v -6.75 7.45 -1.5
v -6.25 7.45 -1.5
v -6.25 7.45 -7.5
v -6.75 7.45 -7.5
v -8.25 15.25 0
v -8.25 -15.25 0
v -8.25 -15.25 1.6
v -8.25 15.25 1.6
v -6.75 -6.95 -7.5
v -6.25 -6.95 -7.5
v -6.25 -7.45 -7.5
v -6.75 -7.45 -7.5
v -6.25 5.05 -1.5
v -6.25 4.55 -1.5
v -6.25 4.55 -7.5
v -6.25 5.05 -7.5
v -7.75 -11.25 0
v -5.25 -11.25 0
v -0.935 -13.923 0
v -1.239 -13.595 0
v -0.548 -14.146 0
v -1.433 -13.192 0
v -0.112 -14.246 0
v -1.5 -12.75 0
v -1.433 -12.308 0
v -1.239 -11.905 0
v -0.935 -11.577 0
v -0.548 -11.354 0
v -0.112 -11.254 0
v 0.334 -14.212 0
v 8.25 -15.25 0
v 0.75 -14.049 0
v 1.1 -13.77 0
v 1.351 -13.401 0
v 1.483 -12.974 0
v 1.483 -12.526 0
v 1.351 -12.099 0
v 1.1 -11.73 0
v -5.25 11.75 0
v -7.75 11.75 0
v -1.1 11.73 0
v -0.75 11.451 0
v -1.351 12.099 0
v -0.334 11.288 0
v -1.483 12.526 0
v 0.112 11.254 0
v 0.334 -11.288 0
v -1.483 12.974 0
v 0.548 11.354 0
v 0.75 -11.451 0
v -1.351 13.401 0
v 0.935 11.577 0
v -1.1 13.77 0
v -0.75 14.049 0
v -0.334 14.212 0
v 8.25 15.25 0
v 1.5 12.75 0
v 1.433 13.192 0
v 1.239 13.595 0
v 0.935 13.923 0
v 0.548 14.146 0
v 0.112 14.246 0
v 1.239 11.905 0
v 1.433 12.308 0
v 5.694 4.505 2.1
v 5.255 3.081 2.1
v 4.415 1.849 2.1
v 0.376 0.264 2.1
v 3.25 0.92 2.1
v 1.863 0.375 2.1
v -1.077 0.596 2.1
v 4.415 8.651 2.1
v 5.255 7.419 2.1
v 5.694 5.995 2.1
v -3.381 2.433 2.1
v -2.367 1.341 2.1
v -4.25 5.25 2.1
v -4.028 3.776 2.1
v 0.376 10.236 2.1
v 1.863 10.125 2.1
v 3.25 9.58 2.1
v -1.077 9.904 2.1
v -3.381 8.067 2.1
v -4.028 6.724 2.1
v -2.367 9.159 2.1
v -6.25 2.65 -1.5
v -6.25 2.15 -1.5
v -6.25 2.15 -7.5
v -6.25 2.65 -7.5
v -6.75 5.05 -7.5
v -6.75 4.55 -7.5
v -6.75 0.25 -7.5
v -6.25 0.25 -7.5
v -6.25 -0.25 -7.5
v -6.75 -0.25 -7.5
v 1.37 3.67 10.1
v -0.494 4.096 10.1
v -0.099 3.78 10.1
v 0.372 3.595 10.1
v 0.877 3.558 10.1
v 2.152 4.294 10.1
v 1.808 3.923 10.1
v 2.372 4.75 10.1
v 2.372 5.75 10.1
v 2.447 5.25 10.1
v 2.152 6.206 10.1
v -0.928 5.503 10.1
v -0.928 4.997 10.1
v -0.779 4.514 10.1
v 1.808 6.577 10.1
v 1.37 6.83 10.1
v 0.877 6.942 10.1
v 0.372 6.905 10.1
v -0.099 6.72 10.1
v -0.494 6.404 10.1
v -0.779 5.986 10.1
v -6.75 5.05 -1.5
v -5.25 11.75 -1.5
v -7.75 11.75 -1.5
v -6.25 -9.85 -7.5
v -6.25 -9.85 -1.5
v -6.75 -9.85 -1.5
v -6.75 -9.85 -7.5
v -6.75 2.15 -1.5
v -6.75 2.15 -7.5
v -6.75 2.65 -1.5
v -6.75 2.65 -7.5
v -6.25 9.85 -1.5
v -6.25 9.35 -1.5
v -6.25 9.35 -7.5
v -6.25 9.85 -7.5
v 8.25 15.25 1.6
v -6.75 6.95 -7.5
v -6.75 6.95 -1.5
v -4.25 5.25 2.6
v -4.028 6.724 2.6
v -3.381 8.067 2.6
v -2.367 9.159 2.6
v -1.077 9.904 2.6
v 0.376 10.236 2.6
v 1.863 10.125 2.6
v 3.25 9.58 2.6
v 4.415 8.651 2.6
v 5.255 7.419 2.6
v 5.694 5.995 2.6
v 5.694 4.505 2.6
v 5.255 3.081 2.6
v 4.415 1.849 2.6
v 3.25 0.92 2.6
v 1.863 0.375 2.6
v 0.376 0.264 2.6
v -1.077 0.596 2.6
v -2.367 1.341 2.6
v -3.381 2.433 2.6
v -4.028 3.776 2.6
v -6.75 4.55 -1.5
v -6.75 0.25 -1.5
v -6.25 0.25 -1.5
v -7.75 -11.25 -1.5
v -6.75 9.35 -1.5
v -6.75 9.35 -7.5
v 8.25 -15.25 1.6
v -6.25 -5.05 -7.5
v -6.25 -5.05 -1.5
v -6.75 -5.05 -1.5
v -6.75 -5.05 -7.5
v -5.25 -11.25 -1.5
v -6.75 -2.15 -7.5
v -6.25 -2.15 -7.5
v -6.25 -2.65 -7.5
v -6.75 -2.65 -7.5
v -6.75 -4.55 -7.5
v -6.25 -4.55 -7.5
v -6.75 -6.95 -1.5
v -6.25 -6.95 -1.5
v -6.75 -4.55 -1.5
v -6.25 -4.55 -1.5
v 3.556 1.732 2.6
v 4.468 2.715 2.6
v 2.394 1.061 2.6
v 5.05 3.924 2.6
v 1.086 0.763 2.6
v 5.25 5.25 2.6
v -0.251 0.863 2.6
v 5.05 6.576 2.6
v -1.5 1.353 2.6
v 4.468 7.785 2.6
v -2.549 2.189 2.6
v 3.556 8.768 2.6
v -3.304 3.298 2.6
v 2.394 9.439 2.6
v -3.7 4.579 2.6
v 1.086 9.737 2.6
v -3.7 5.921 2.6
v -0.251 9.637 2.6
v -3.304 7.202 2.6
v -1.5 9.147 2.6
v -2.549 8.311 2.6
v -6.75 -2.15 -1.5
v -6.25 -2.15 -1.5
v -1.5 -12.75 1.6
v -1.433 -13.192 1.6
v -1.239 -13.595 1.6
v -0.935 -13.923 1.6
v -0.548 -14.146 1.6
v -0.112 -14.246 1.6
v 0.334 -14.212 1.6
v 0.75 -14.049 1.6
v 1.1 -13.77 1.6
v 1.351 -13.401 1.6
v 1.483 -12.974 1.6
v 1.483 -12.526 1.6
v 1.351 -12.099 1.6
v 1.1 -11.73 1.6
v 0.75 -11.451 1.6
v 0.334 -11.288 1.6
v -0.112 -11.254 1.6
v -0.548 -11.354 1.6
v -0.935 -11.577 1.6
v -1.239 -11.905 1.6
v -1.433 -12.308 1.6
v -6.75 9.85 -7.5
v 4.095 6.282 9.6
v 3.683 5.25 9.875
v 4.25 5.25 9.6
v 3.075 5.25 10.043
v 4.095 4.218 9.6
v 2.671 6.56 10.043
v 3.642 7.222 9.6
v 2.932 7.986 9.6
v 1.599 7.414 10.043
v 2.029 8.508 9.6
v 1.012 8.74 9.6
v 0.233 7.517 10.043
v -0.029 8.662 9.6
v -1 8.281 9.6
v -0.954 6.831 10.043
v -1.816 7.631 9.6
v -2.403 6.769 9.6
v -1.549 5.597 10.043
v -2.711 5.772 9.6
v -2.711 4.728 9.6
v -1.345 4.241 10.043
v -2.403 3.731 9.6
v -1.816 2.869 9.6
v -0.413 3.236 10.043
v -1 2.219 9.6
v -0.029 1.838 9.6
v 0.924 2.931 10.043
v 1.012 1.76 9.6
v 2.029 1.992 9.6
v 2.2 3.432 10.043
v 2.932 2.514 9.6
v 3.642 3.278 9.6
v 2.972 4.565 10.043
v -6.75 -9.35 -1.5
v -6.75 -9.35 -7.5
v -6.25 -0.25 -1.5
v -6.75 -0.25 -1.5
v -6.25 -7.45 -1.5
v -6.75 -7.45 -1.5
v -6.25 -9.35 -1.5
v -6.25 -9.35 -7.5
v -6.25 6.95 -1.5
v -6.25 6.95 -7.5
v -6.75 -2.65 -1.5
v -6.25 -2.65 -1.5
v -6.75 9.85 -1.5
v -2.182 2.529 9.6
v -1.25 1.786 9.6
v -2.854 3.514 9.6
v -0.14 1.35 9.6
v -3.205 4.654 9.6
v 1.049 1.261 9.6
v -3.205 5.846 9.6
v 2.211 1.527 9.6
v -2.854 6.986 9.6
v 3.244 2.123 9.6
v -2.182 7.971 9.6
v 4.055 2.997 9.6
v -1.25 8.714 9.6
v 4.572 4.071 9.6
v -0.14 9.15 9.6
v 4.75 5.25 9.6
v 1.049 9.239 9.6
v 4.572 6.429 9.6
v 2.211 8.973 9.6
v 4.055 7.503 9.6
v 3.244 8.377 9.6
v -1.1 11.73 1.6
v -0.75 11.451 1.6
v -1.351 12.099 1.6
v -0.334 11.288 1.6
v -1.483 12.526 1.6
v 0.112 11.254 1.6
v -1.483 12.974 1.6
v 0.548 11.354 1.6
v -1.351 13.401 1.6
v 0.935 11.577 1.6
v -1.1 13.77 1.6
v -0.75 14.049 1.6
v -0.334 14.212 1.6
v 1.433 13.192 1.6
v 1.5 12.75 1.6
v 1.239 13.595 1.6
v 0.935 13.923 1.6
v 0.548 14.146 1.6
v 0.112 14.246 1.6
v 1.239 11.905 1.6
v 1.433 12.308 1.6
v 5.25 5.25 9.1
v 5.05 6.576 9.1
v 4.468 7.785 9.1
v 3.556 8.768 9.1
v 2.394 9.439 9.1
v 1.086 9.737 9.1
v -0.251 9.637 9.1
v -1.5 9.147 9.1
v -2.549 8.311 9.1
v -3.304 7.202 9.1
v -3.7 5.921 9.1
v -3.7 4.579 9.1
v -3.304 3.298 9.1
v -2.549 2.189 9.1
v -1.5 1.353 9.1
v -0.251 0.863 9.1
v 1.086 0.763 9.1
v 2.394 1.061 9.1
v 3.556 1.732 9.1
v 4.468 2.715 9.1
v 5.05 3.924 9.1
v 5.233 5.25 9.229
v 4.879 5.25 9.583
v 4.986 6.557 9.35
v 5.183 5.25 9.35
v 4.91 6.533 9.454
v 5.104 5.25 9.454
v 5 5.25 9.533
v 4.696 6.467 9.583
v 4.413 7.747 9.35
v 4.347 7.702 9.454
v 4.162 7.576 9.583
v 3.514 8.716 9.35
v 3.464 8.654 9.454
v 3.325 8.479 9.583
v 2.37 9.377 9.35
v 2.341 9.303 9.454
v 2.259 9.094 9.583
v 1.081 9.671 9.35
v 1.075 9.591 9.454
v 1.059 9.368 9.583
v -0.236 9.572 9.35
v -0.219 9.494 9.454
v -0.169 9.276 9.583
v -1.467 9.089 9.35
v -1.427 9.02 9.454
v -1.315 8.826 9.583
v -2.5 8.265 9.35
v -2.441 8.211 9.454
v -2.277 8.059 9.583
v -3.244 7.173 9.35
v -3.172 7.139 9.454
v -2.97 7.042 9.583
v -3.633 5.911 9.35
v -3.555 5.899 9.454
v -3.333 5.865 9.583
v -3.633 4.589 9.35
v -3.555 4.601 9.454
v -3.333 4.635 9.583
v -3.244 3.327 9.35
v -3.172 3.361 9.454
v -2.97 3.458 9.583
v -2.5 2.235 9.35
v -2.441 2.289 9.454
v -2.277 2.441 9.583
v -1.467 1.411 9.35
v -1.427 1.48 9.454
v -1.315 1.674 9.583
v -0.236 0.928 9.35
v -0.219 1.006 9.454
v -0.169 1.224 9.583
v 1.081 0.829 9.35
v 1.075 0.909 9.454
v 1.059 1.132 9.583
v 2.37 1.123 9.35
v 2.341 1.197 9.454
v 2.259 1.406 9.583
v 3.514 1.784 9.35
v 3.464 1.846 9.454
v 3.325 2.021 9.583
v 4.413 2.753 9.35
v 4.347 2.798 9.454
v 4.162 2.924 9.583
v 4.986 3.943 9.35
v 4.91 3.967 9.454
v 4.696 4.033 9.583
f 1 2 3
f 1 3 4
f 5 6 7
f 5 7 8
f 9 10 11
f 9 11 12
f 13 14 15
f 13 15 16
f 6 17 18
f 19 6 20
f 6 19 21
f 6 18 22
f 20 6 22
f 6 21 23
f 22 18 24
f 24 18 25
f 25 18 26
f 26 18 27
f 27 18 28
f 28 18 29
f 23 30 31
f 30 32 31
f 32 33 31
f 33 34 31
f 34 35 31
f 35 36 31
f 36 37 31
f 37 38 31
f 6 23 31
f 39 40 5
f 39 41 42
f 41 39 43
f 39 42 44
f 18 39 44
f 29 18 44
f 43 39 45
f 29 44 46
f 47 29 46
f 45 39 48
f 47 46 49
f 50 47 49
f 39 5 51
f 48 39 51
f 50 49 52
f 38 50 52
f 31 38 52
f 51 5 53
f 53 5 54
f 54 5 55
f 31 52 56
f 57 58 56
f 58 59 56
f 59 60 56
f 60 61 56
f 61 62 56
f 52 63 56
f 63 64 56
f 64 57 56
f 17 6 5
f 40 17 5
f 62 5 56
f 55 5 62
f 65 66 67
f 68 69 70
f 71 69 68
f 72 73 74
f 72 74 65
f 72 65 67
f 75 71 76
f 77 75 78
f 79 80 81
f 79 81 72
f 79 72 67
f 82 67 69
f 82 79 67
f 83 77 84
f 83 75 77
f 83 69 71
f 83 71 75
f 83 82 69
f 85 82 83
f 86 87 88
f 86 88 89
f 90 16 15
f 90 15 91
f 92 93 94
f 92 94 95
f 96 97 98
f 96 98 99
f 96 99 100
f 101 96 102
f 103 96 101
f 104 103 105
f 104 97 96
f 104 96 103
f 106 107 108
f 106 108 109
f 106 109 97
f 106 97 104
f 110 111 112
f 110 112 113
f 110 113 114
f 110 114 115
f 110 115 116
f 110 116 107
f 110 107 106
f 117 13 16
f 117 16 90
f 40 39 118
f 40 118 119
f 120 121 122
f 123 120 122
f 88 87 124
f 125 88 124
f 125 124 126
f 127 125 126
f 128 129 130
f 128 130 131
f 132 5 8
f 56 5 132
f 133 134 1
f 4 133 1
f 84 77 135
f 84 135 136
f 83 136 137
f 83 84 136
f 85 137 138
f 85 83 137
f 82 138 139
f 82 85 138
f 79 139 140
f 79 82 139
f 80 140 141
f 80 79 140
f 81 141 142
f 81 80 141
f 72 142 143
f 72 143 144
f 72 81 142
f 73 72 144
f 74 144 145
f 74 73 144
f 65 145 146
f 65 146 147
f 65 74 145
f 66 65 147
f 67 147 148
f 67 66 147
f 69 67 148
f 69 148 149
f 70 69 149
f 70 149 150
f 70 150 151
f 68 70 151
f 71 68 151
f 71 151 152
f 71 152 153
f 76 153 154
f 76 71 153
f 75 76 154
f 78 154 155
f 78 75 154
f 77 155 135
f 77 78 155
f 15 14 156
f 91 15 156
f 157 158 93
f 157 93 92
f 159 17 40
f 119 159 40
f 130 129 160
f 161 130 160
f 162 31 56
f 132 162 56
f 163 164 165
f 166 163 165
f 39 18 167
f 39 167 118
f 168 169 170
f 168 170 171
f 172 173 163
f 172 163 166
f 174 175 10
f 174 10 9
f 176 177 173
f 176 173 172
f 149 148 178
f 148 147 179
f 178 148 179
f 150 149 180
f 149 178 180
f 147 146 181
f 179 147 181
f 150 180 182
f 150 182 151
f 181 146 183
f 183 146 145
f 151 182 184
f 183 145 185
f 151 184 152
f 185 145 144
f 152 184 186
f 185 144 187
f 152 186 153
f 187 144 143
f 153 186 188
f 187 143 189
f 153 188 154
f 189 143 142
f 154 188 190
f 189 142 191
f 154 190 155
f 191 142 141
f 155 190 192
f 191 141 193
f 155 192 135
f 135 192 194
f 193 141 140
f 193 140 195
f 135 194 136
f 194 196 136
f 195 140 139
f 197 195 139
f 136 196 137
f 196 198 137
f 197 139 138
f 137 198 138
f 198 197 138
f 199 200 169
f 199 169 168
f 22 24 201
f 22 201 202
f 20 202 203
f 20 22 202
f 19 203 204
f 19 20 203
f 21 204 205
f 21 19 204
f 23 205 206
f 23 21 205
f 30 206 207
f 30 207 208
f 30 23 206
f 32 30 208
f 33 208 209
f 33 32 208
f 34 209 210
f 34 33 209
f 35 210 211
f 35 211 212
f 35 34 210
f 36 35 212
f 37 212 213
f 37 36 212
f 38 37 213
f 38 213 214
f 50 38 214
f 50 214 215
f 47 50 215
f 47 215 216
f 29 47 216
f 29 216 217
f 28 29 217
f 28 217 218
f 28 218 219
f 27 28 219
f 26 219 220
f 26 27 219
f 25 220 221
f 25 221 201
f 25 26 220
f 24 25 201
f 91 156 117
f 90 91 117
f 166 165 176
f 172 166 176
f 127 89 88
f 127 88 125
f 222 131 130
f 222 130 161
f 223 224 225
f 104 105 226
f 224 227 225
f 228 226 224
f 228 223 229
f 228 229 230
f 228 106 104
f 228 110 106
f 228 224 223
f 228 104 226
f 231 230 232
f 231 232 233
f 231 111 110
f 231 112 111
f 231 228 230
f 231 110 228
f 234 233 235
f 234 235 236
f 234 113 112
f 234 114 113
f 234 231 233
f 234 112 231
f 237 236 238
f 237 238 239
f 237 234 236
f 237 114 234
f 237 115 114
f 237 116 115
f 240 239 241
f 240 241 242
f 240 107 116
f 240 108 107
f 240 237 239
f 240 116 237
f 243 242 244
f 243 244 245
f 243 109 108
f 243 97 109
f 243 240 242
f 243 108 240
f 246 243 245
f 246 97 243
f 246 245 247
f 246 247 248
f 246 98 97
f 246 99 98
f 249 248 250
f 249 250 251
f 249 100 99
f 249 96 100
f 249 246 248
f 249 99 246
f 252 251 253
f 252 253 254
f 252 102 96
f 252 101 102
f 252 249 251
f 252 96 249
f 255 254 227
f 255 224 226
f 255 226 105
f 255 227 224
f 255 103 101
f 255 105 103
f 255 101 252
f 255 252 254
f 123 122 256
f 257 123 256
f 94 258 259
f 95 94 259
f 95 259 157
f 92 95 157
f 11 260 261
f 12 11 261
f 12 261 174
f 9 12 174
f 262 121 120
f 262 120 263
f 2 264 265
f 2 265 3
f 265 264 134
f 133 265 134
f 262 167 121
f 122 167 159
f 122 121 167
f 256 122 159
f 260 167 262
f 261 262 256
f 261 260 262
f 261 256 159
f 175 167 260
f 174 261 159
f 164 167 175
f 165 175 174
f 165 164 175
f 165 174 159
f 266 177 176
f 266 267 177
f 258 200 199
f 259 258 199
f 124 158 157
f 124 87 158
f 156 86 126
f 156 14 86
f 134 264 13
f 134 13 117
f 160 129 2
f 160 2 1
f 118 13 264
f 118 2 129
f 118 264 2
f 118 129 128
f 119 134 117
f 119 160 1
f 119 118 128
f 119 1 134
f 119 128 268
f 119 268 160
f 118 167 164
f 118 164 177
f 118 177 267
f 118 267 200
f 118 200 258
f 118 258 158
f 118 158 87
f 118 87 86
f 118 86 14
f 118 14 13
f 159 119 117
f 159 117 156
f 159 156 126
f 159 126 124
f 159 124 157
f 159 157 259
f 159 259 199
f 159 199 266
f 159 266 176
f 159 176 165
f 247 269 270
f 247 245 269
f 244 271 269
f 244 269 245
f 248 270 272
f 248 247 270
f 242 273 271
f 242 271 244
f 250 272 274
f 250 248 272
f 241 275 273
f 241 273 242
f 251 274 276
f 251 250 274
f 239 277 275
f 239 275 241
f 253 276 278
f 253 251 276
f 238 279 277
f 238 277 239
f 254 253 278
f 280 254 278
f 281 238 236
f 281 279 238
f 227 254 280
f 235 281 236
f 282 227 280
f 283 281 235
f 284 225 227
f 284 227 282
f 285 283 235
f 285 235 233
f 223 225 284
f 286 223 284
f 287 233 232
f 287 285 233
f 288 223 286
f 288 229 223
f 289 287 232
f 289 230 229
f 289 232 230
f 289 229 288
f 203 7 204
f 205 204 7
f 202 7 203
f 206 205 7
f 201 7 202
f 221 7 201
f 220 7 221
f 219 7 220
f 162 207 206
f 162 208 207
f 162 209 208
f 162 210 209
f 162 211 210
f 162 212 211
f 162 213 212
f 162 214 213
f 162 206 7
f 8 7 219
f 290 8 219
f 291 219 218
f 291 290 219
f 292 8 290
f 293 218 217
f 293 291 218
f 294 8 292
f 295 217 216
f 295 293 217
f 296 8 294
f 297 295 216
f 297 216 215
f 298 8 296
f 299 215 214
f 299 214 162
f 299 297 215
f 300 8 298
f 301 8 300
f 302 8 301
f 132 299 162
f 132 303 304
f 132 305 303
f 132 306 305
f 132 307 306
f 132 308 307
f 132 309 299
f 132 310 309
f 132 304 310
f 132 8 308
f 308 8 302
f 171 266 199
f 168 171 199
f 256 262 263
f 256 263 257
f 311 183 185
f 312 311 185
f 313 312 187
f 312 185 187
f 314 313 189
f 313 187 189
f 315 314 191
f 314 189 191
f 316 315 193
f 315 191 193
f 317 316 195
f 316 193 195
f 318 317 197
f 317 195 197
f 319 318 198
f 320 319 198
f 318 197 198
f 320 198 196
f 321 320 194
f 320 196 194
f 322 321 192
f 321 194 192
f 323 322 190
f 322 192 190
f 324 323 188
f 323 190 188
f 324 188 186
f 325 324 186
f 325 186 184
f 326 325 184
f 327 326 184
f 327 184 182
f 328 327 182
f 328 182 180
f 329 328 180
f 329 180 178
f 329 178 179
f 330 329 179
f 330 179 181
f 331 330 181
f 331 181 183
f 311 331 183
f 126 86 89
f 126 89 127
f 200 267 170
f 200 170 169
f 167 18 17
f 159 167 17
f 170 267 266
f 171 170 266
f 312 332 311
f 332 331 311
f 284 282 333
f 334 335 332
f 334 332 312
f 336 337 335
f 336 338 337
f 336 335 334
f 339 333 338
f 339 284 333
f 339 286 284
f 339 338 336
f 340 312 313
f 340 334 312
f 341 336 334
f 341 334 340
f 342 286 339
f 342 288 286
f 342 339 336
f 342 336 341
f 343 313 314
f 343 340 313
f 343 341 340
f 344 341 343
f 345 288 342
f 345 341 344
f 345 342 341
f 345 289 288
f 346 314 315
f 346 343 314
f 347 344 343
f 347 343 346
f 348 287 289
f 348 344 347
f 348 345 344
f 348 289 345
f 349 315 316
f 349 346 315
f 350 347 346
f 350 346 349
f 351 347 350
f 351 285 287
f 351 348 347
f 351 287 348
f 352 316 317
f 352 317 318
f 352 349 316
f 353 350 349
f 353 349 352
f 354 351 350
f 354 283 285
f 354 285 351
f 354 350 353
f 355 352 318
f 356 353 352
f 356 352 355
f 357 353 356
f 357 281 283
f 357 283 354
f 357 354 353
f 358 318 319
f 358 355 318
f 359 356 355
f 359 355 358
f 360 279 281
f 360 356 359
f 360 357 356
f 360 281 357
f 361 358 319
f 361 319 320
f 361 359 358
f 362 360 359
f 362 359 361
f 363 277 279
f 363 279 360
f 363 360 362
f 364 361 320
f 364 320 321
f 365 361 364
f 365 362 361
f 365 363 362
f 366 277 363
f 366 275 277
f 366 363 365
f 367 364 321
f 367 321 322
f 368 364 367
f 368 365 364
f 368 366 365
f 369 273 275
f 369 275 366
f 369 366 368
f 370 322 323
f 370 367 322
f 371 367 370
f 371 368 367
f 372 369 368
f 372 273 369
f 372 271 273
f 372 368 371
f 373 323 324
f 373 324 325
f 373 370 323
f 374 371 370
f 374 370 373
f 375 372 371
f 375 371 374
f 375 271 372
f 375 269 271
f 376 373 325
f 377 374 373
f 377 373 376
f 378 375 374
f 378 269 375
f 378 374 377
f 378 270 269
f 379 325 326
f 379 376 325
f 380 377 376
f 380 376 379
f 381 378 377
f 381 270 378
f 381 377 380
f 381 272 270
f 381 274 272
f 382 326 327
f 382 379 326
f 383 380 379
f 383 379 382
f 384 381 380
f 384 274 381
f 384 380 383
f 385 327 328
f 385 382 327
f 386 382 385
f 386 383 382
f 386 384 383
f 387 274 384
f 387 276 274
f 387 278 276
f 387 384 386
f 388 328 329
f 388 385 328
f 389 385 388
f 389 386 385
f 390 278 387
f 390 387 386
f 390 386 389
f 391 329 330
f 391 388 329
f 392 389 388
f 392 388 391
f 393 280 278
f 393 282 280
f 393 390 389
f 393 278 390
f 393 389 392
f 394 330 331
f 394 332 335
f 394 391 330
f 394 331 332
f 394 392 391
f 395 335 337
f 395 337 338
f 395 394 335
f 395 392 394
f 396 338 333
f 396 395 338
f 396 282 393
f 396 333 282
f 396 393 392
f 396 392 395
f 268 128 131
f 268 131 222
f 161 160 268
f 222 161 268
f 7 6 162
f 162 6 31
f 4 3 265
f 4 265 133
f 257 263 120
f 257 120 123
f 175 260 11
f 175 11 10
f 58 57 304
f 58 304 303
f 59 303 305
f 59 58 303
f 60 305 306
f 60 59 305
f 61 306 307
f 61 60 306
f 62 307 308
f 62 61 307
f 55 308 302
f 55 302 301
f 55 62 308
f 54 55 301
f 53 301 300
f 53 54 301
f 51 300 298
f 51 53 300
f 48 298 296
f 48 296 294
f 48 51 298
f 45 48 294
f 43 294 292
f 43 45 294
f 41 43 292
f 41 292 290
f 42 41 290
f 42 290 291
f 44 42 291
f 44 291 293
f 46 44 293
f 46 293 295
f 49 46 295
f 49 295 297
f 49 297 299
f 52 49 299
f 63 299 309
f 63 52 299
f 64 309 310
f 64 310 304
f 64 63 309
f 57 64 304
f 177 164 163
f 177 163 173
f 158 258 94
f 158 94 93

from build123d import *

# Parameters (mm, degrees)
SKETCH1_W          = 16.5
SKETCH1_H          = 30.5
SKETCH1_R          = 1.5
EXTRUDE1_DEPTH     = 1.6
EXTRUDE2_START     = 0.5
SKETCH2_R          = 4.5
EXTRUDE2_DEPTH     = 8
SKETCH3_R          = 4.5
SKETCH3_R_2        = 3.5
CUT_EXTRUDE1_DEPTH = 0.5
FILLET2_R          = 3.5
FILLET3_R          = 0.5
SKETCH4_R          = 5
EXTRUDE3_DEPTH     = 0.5
SKETCH5_W          = 2.5
SKETCH5_H          = 23
EXTRUDE4_DEPTH     = 1.5
SKETCH6_W          = 0.5
SKETCH6_H          = 0.5
EXTRUDE5_DEPTH     = 6


with BuildPart() as part:
    # Sketch1 → Extrude1 (new body)
    with BuildSketch(Plane.XY):
        Rectangle(SKETCH1_W, SKETCH1_H)
        with Locations((0, 12.75)):
            Circle(SKETCH1_R, mode=Mode.SUBTRACT)
        with Locations(Location((0, -12.75, 0), (0, 0, 180))):
            Circle(SKETCH1_R, mode=Mode.SUBTRACT)
    extrude(amount=EXTRUDE1_DEPTH)

    # Sketch5 → Extrude4 (add)
    with BuildSketch(Plane(origin=(0, 0, 0), x_dir=(-1, 0, 0), z_dir=(0, 0, -1))):
        with Locations((6.5, 0.25)):
            Rectangle(SKETCH5_W, SKETCH5_H)
    extrude(amount=EXTRUDE4_DEPTH)

    # Sketch6 → Extrude5 (add)
    with BuildSketch(Plane(origin=(0, 0, -1.5), x_dir=(-1, 0, 0), z_dir=(0, 0, -1))):
        with Locations((6.5, 9.6)):
            Rectangle(SKETCH6_W, SKETCH6_H)
        with Locations((6.5, 7.2)):
            Rectangle(SKETCH6_W, SKETCH6_H)
        with Locations((6.5, 4.8)):
            Rectangle(SKETCH6_W, SKETCH6_H)
        with Locations((6.5, 2.4)):
            Rectangle(SKETCH6_W, SKETCH6_H)
        with Locations((6.5, 0)):
            Rectangle(SKETCH6_W, SKETCH6_H)
        with Locations((6.5, -2.4)):
            Rectangle(SKETCH6_W, SKETCH6_H)
        with Locations((6.5, -4.8)):
            Rectangle(SKETCH6_W, SKETCH6_H)
        with Locations((6.5, -7.2)):
            Rectangle(SKETCH6_W, SKETCH6_H)
        with Locations((6.5, -9.6)):
            Rectangle(SKETCH6_W, SKETCH6_H)
    extrude(amount=EXTRUDE5_DEPTH)


with BuildPart() as body_2:
    # Sketch2 → Extrude2 (new body)
    with BuildSketch(Plane.XY.offset(1.6).offset(EXTRUDE2_START)):
        with Locations((0.75, 5.25)):
            Circle(SKETCH2_R)
    extrude(amount=EXTRUDE2_DEPTH)

    # Sketch3 → Cut-Extrude1 (cut)
    with BuildSketch(Plane.XY.offset(10.1)):
        with Locations((0.75, 5.25)):
            Circle(SKETCH3_R)
        with Locations((0.75, 5.25)):
            Circle(SKETCH3_R_2, mode=Mode.SUBTRACT)
    extrude(amount=-CUT_EXTRUDE1_DEPTH, mode=Mode.SUBTRACT)

    # Fillet2
    # the kernel refuses this fillet: 3.5 mm, written as the material it takes off along each edge
    with BuildSketch(Plane(origin=(0.75, 5.25, 10.1), x_dir=(1, 0, 0), z_dir=(0, -1, 0))) as fillet2_piece_1:
        with BuildLine():
            CenterArc((1.697224362, -3.5), FILLET2_R, 58.997280866, 31.002719134)
            Line((1.697224362, 0), (1.697224362, 0.07))
            Line((1.697224362, 0.07), (3.5, 0.07))
            Line((3.5, 0.07), (3.57, 0))
            ThreePointArc((3.57, 0), (3.57, -0.25), (3.536055513, -0.44))
            Line((3.536055513, -0.44), (3.5, -0.5))
        make_face()
    revolve(axis=Axis((0.75, 5.25, 10.1), (0, 0, 1)), mode=Mode.SUBTRACT)

    # Fillet3
    fillet3_edges = [body_2.edges().sort_by_distance(p)[0] for p in [
        (-3.75, 5.25, 9.6),
    ]]
    fillet(fillet3_edges, radius=FILLET3_R)

    # Sketch4 → Extrude3 (add)
    with BuildSketch(Plane(origin=(0, 0, 2.1), x_dir=(-1, 0, 0), z_dir=(0, 0, -1))):
        with Locations((-0.75, 5.25)):
            Circle(SKETCH4_R)
    extrude(amount=-EXTRUDE3_DEPTH)


solid = Compound([part.part, body_2.part])
